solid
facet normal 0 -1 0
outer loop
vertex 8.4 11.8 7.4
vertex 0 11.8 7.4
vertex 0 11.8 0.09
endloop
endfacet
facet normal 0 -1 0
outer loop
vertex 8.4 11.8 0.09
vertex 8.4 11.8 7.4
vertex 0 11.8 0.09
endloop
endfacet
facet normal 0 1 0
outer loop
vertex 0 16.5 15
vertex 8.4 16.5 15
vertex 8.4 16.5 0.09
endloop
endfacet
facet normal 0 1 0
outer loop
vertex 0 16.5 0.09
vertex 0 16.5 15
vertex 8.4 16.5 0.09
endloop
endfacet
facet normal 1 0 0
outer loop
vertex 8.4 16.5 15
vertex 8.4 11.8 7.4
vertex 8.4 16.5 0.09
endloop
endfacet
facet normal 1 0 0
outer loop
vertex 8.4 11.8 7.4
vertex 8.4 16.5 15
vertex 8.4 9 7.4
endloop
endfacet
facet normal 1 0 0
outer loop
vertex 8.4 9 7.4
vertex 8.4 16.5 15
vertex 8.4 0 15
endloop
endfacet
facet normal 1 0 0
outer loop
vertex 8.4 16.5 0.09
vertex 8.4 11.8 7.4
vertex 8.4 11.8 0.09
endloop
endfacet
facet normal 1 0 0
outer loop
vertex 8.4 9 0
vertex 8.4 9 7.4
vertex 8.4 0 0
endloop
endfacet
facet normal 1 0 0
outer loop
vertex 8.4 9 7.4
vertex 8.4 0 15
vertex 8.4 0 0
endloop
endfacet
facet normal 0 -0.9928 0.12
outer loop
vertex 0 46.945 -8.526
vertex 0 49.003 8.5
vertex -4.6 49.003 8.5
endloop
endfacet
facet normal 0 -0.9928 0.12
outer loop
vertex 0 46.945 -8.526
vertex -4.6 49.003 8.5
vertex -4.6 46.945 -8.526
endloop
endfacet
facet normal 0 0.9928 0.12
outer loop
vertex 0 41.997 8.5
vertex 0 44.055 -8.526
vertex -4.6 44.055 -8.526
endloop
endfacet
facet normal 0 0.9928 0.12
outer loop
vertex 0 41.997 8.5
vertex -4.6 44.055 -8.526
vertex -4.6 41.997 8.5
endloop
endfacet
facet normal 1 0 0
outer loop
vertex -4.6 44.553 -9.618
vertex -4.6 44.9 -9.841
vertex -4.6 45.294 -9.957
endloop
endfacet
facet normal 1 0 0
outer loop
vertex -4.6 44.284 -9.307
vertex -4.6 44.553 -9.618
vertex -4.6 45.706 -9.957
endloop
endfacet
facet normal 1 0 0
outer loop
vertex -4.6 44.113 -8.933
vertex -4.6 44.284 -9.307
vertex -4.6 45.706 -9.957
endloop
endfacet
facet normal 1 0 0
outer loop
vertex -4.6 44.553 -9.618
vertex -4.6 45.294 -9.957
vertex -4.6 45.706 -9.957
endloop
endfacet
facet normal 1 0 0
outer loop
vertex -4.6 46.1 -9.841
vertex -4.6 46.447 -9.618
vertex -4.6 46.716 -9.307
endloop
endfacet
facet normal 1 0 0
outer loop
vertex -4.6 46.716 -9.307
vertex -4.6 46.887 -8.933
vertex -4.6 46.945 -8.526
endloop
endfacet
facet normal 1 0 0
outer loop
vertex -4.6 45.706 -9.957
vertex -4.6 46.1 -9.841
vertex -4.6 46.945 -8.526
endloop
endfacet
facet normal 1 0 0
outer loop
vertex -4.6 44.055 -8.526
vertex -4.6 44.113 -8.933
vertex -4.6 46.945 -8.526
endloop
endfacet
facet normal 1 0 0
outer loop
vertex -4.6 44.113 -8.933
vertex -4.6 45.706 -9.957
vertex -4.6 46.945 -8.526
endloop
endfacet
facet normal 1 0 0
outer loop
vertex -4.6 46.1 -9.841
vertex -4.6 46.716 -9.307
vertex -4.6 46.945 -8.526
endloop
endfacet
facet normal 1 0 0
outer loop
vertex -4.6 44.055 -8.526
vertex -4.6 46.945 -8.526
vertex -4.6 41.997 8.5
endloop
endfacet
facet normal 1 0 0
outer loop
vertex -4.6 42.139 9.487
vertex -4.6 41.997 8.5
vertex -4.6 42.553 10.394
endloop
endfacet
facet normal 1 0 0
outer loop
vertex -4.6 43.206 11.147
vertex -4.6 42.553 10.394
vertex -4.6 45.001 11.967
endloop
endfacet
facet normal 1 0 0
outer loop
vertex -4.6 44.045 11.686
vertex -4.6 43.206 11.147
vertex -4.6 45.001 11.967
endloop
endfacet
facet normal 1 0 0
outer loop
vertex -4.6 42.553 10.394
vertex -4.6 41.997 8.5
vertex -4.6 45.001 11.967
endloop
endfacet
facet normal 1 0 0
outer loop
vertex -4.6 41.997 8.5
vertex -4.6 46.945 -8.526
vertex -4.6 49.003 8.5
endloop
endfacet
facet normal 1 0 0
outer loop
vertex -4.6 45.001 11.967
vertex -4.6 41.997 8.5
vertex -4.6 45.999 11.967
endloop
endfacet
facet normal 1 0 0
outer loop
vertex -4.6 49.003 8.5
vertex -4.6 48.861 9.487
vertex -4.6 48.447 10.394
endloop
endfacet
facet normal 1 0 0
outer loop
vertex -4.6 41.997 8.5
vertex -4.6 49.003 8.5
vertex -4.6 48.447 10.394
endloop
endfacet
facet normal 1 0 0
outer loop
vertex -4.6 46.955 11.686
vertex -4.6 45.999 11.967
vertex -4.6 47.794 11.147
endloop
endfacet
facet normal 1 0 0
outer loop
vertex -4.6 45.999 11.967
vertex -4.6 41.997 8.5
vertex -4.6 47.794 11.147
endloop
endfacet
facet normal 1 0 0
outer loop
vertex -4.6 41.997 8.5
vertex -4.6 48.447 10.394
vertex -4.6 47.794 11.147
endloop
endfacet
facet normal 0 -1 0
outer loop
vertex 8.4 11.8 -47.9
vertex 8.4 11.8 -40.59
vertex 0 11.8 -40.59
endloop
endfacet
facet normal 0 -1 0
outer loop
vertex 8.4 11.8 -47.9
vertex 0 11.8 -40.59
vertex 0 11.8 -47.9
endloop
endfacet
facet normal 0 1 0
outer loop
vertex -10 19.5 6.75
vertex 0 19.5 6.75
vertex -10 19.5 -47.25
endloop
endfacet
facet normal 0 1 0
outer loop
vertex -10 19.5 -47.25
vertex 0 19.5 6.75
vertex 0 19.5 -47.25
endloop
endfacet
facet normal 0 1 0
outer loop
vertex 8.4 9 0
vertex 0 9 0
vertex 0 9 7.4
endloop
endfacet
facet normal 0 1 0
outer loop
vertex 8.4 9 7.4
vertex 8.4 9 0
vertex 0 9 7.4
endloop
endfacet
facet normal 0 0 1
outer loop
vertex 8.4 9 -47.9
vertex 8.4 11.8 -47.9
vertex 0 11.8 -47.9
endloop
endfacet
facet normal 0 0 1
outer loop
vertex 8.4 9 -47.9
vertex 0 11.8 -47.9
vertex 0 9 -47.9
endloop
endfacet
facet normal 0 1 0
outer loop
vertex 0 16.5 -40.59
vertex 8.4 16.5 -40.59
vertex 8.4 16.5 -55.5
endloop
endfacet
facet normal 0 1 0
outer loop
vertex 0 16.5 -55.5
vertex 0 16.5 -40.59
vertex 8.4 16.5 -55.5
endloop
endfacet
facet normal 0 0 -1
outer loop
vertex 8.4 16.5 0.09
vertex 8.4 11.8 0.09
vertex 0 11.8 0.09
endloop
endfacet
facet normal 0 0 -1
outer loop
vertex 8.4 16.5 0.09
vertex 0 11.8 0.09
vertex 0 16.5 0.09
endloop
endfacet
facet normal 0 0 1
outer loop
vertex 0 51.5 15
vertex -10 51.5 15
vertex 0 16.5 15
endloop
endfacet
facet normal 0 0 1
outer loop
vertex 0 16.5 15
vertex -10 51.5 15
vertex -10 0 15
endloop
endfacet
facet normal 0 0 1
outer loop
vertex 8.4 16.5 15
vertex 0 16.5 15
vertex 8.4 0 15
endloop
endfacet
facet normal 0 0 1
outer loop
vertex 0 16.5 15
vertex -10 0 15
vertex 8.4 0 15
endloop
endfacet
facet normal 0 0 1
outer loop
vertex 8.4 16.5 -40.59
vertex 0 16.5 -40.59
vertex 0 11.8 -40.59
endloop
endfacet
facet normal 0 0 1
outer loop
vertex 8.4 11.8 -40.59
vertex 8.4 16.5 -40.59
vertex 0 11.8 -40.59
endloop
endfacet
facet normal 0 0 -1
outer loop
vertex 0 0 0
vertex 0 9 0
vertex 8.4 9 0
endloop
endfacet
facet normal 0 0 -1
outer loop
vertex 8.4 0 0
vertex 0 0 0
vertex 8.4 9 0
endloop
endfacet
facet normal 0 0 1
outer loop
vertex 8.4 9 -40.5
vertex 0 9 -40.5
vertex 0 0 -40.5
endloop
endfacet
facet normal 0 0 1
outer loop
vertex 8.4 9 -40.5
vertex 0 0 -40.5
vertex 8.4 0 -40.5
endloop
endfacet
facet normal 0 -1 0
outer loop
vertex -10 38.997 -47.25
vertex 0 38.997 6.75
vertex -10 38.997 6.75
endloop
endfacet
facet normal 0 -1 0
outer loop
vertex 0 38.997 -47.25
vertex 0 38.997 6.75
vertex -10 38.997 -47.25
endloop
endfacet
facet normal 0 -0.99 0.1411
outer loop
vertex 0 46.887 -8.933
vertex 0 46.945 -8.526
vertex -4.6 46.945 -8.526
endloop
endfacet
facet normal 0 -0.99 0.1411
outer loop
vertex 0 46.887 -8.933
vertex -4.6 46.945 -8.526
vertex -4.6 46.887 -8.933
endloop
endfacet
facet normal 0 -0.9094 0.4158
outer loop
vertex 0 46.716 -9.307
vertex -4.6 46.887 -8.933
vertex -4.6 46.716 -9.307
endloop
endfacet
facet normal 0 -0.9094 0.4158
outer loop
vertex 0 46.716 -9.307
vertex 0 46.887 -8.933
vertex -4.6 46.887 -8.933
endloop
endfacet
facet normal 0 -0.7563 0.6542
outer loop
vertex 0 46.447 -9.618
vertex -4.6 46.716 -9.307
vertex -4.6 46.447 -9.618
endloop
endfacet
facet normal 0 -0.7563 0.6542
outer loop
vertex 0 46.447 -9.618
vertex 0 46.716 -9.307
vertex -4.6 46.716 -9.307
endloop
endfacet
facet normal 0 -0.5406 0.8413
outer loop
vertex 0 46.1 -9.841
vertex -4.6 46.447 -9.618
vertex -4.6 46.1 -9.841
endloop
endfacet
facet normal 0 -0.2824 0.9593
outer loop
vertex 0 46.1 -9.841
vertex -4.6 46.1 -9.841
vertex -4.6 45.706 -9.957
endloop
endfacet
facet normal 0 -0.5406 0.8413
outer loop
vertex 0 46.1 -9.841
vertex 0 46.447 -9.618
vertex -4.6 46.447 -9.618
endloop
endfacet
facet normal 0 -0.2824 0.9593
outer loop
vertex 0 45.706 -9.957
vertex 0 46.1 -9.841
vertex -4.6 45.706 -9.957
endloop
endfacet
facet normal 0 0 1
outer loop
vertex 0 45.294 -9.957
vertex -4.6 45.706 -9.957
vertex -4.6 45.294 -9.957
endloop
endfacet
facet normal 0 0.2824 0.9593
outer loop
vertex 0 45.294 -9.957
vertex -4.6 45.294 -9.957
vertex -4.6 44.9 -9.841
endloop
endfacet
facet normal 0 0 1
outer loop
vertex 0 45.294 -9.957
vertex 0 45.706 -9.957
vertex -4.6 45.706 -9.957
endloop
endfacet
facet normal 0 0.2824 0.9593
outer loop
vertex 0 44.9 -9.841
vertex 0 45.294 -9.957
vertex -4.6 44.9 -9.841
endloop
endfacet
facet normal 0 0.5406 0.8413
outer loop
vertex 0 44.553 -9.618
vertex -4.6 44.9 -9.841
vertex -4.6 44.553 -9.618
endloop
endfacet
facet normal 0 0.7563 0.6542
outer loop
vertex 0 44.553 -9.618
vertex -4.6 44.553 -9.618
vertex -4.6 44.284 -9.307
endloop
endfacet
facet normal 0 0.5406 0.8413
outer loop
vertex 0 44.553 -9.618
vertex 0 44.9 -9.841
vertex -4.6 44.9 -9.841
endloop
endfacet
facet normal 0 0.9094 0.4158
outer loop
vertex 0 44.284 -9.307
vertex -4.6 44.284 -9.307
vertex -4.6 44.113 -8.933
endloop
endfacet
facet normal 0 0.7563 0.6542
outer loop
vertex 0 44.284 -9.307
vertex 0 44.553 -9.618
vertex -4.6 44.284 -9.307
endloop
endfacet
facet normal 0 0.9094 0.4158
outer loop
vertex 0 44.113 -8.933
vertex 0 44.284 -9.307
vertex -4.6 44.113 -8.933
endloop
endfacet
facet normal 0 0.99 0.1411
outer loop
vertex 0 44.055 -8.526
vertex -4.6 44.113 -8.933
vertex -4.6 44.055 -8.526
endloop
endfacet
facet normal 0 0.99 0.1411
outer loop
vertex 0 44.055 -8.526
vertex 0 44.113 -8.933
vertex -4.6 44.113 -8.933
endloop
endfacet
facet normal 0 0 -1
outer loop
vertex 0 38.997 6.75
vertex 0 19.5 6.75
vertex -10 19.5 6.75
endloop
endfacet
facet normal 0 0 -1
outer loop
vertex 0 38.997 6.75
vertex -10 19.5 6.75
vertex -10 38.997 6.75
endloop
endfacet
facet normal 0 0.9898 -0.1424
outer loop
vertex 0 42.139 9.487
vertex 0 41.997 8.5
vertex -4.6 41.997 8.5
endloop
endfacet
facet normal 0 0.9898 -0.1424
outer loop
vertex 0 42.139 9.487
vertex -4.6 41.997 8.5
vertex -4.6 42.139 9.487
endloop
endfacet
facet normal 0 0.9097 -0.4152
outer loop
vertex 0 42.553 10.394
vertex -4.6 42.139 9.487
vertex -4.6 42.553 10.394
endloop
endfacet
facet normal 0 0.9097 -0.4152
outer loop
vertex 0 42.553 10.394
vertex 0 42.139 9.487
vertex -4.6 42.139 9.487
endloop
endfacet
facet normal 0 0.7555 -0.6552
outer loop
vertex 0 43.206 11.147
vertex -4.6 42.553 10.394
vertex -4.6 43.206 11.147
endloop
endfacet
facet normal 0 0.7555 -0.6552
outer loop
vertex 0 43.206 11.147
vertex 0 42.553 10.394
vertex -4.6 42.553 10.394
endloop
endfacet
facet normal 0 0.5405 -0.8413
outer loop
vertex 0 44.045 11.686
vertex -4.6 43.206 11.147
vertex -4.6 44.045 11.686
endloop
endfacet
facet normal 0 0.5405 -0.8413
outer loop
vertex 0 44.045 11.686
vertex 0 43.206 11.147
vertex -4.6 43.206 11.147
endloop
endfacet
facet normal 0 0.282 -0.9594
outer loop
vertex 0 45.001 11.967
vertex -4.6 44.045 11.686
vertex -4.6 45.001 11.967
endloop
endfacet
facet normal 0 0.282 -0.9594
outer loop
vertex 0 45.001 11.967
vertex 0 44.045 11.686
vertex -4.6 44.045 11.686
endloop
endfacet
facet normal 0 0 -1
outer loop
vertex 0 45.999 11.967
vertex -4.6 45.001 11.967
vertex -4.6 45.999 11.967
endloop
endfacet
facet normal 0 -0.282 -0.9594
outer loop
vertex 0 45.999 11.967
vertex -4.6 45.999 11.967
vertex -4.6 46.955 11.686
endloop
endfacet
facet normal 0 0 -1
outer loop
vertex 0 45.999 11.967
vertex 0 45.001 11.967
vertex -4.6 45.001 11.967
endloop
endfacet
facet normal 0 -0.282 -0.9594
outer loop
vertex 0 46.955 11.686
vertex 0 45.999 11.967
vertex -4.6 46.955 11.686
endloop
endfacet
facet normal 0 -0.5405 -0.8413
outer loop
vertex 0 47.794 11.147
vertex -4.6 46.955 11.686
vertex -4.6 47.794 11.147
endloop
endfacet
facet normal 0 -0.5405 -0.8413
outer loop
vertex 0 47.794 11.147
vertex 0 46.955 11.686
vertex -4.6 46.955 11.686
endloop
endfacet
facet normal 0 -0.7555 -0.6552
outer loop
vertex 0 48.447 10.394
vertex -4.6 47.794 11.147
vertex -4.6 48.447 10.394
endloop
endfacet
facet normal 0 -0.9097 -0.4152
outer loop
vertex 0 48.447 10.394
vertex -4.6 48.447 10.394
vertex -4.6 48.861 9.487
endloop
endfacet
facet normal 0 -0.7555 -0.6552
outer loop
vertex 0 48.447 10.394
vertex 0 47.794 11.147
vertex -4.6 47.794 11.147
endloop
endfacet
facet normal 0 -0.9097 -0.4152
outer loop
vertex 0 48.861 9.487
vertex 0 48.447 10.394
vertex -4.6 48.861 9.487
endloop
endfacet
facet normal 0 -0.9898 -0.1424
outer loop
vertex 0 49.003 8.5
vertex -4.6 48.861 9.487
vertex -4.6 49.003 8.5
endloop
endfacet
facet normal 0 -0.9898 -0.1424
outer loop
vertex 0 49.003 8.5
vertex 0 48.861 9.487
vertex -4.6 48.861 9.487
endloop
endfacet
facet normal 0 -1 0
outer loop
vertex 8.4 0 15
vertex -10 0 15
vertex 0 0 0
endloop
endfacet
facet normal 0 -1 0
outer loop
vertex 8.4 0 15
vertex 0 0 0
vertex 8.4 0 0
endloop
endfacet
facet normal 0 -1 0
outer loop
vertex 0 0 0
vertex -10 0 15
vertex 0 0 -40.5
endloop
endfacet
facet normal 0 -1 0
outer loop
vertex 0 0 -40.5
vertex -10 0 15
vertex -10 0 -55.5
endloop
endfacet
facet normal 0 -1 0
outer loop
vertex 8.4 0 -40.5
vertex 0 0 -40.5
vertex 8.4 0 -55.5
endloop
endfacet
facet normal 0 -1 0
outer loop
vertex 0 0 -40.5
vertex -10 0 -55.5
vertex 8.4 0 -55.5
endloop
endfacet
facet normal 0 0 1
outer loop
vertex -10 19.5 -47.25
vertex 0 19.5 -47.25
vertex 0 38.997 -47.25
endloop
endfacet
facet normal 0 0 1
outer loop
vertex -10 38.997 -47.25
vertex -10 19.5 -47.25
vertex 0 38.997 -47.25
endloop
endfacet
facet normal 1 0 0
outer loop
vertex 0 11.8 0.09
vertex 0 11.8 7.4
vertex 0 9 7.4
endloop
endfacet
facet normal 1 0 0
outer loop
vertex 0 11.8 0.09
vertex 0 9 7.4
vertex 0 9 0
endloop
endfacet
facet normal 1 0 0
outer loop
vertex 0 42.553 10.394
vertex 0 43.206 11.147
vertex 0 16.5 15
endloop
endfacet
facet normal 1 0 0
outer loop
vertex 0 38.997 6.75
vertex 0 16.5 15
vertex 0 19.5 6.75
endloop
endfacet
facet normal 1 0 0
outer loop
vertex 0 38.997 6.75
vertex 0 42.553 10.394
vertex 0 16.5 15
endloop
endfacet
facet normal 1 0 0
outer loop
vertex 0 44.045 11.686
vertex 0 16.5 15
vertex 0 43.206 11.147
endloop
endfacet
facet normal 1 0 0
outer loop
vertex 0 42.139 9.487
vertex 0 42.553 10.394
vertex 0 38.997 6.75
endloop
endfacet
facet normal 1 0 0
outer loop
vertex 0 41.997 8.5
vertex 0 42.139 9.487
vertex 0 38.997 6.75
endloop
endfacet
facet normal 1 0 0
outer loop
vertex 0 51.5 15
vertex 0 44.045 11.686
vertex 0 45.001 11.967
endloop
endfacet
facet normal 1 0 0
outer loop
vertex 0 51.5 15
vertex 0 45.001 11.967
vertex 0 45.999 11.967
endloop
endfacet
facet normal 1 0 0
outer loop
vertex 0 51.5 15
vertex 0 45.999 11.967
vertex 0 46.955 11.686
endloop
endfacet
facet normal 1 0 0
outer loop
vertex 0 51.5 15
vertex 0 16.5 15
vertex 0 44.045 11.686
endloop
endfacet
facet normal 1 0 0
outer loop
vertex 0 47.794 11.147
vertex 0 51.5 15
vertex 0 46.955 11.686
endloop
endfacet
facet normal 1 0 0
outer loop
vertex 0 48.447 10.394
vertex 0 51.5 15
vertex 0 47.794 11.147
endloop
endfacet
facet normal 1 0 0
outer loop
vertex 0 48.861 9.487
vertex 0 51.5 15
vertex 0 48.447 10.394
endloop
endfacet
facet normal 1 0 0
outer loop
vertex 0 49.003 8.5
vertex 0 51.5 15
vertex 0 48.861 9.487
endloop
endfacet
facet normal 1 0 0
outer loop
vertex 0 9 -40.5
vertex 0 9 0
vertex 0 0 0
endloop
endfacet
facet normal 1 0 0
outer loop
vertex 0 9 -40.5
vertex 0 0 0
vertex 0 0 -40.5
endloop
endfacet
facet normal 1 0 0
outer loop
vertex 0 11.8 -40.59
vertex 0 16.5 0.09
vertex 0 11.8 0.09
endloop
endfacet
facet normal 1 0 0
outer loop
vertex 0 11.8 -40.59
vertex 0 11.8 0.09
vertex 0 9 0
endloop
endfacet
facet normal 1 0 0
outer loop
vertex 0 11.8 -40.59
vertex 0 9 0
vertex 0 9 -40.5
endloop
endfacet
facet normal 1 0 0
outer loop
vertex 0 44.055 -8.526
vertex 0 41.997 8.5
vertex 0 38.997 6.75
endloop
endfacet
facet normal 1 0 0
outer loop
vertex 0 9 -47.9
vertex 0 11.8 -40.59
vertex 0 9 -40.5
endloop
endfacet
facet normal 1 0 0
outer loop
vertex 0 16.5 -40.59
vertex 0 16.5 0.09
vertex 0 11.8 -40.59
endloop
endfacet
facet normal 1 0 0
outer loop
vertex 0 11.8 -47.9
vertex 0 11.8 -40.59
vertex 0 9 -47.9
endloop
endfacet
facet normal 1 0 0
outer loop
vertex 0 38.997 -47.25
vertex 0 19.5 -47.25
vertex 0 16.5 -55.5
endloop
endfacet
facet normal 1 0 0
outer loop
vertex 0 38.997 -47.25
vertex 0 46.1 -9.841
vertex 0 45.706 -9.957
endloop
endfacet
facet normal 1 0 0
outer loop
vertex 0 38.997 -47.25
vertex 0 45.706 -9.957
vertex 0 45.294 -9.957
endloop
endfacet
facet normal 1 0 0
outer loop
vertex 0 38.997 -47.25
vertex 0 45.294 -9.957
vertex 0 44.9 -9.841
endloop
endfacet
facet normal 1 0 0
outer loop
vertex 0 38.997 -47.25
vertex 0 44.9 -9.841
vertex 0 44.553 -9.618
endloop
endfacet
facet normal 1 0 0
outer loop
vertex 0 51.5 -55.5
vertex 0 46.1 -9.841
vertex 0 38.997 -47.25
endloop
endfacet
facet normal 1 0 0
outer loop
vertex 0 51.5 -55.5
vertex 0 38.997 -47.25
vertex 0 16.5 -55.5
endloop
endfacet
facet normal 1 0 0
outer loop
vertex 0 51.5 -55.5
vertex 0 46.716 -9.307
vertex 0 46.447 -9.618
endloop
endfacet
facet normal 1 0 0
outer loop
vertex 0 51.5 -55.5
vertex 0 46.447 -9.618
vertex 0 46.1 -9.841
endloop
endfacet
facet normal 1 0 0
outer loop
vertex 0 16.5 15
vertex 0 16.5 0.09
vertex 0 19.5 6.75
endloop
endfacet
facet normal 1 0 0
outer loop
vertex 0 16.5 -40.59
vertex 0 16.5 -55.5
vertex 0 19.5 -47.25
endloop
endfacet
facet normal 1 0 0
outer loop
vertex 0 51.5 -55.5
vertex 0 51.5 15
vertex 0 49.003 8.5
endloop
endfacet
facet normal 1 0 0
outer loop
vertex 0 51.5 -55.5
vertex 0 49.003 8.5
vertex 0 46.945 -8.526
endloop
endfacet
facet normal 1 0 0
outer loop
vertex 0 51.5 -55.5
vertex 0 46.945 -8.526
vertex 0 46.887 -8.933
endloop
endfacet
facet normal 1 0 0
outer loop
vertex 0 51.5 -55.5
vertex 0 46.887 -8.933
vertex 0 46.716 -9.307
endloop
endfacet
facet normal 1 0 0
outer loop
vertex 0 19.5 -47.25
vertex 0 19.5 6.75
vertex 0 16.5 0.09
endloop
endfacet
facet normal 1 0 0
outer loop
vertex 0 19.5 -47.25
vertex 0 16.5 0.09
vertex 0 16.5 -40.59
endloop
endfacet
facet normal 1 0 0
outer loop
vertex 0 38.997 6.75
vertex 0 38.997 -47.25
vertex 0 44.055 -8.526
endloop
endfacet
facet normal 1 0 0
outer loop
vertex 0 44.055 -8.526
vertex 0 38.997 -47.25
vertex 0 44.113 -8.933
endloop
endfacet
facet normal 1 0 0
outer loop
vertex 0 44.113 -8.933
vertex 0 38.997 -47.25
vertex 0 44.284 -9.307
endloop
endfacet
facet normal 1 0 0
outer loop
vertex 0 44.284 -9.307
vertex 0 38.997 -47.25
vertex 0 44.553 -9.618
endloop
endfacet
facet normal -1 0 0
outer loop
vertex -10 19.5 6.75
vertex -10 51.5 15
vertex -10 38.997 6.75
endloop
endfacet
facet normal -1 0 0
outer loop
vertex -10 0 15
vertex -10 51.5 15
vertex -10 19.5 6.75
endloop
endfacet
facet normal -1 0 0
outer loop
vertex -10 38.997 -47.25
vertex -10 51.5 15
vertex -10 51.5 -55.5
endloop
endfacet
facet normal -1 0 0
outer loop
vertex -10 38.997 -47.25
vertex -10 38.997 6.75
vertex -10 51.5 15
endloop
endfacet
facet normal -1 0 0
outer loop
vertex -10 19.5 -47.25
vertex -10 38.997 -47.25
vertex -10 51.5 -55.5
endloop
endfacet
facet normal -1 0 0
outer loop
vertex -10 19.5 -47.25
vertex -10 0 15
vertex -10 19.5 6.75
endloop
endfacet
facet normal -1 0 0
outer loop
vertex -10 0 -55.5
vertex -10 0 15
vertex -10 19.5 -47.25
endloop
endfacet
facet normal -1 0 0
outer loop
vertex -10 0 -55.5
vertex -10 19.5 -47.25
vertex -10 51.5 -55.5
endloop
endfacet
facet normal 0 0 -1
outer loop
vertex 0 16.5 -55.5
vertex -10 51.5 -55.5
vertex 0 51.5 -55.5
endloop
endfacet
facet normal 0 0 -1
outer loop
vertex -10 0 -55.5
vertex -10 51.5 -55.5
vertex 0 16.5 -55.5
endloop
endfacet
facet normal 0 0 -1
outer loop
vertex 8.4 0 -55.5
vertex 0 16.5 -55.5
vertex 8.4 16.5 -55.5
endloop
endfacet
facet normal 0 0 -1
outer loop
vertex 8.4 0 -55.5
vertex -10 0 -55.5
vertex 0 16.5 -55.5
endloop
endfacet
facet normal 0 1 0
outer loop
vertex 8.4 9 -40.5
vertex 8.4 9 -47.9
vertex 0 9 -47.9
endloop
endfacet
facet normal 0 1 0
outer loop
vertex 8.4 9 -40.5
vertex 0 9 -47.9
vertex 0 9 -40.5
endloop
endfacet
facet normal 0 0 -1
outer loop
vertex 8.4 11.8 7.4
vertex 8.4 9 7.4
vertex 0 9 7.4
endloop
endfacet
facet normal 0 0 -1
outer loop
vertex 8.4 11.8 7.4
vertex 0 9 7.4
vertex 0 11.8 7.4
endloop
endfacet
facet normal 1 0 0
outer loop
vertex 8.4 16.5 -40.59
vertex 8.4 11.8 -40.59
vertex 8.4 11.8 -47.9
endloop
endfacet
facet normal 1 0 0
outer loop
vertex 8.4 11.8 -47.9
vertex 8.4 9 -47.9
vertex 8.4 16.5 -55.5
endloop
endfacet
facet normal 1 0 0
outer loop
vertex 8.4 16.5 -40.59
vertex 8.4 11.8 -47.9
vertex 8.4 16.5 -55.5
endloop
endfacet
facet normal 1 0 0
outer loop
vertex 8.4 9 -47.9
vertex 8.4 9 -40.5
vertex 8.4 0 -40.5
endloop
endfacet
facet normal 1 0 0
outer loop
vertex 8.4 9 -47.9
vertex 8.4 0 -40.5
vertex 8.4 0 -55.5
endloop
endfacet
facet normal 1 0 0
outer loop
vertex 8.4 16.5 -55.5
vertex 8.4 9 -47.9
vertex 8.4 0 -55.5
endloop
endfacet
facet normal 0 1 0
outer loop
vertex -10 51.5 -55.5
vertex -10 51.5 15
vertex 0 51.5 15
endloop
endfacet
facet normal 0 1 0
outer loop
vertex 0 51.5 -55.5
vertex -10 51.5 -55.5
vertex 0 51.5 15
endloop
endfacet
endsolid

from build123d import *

# Parameters (mm, degrees)
BOSS_EXTRUDE1_DEPTH = 9
SKETCH2_W           = 8.4
SKETCH2_H           = 40.5
CUT_EXTRUDE1_DEPTH  = 40.4
SKETCH3_W           = 18.4
SKETCH3_H           = 70.5
BOSS_EXTRUDE2_DEPTH = 42.5
CUT_EXTRUDE2_DEPTH  = 8.4
SKETCH5_W           = 70.5
SKETCH5_H           = 35
CUT_EXTRUDE3_DEPTH  = 8.4
CUT_EXTRUDE4_DEPTH  = 4.6
SKETCH8_W           = 54
SKETCH8_H           = 19.4972
CUT_EXTRUDE5_DEPTH  = 11


with BuildPart() as part:
    # Sketch1 → Boss-Extrude1 (new body)
    with BuildSketch(Plane(origin=(0, 0, 0), x_dir=(1, 0, 0), z_dir=(0, 1, 0))):
        Polygon((8.4, -15), (8.4, 0), (8.4, 40.5), (8.4, 55.5), (-10, 55.5), (-10, -15), align=None)
    extrude(amount=BOSS_EXTRUDE1_DEPTH)

    # Sketch2 → Cut-Extrude1 (cut)
    with BuildSketch(Plane(origin=(0, 9, 0), x_dir=(1, 0, 0), z_dir=(0, 1, 0))):
        with Locations((4.2, 20.25)):
            Rectangle(SKETCH2_W, SKETCH2_H)
    extrude(amount=-CUT_EXTRUDE1_DEPTH, mode=Mode.SUBTRACT)

    # Sketch3 → Boss-Extrude2 (add)
    with BuildSketch(Plane(origin=(0, 9, 0), x_dir=(1, 0, 0), z_dir=(0, 1, 0))):
        with Locations((-0.8, 20.25)):
            Rectangle(SKETCH3_W, SKETCH3_H)
    extrude(amount=BOSS_EXTRUDE2_DEPTH)

    # Sketch4 → Cut-Extrude2 (cut)
    with BuildSketch(Plane(origin=(8.4, 0, 0), x_dir=(0, 0, -1), z_dir=(1, 0, 0))):
        Polygon((-0.09, 11.8), (-0.09, 44.4), (40.59, 44.4), (40.59, 11.8), (47.9, 11.8), (47.9, 9), (-7.4, 9), (-7.4, 11.8), align=None)
    extrude(amount=-CUT_EXTRUDE2_DEPTH, mode=Mode.SUBTRACT)

    # Sketch5 → Cut-Extrude3 (cut)
    with BuildSketch(Plane(origin=(8.4, 0, 0), x_dir=(0, 0, -1), z_dir=(1, 0, 0))):
        with Locations((20.25, 34)):
            Rectangle(SKETCH5_W, SKETCH5_H)
    extrude(amount=-CUT_EXTRUDE3_DEPTH, mode=Mode.SUBTRACT)

    # Sketch7 → Cut-Extrude4 (cut)
    with BuildSketch(Plane(origin=(0, 0, 0), x_dir=(0, 0, -1), z_dir=(1, 0, 0))):
        with BuildLine():
            Line((-8.5, 49.0028), (8.5259, 46.9454))
            ThreePointArc((8.5259, 46.9454), (9.9713, 45.5), (8.5259, 44.0546))
            Line((8.5259, 44.0546), (-8.5, 41.9972))
            ThreePointArc((-8.5, 41.9972), (-12.0028, 45.5), (-8.5, 49.0028))
        make_face()
    extrude(amount=-CUT_EXTRUDE4_DEPTH, mode=Mode.SUBTRACT)

    # Sketch8 → Cut-Extrude5 (cut, through all)
    with BuildSketch(Plane(origin=(0, 0, 0), x_dir=(0, 0, -1), z_dir=(1, 0, 0))):
        with Locations((20.25, 29.2486)):
            Rectangle(SKETCH8_W, SKETCH8_H)
    extrude(amount=-CUT_EXTRUDE5_DEPTH, mode=Mode.SUBTRACT)


solid = part.part
